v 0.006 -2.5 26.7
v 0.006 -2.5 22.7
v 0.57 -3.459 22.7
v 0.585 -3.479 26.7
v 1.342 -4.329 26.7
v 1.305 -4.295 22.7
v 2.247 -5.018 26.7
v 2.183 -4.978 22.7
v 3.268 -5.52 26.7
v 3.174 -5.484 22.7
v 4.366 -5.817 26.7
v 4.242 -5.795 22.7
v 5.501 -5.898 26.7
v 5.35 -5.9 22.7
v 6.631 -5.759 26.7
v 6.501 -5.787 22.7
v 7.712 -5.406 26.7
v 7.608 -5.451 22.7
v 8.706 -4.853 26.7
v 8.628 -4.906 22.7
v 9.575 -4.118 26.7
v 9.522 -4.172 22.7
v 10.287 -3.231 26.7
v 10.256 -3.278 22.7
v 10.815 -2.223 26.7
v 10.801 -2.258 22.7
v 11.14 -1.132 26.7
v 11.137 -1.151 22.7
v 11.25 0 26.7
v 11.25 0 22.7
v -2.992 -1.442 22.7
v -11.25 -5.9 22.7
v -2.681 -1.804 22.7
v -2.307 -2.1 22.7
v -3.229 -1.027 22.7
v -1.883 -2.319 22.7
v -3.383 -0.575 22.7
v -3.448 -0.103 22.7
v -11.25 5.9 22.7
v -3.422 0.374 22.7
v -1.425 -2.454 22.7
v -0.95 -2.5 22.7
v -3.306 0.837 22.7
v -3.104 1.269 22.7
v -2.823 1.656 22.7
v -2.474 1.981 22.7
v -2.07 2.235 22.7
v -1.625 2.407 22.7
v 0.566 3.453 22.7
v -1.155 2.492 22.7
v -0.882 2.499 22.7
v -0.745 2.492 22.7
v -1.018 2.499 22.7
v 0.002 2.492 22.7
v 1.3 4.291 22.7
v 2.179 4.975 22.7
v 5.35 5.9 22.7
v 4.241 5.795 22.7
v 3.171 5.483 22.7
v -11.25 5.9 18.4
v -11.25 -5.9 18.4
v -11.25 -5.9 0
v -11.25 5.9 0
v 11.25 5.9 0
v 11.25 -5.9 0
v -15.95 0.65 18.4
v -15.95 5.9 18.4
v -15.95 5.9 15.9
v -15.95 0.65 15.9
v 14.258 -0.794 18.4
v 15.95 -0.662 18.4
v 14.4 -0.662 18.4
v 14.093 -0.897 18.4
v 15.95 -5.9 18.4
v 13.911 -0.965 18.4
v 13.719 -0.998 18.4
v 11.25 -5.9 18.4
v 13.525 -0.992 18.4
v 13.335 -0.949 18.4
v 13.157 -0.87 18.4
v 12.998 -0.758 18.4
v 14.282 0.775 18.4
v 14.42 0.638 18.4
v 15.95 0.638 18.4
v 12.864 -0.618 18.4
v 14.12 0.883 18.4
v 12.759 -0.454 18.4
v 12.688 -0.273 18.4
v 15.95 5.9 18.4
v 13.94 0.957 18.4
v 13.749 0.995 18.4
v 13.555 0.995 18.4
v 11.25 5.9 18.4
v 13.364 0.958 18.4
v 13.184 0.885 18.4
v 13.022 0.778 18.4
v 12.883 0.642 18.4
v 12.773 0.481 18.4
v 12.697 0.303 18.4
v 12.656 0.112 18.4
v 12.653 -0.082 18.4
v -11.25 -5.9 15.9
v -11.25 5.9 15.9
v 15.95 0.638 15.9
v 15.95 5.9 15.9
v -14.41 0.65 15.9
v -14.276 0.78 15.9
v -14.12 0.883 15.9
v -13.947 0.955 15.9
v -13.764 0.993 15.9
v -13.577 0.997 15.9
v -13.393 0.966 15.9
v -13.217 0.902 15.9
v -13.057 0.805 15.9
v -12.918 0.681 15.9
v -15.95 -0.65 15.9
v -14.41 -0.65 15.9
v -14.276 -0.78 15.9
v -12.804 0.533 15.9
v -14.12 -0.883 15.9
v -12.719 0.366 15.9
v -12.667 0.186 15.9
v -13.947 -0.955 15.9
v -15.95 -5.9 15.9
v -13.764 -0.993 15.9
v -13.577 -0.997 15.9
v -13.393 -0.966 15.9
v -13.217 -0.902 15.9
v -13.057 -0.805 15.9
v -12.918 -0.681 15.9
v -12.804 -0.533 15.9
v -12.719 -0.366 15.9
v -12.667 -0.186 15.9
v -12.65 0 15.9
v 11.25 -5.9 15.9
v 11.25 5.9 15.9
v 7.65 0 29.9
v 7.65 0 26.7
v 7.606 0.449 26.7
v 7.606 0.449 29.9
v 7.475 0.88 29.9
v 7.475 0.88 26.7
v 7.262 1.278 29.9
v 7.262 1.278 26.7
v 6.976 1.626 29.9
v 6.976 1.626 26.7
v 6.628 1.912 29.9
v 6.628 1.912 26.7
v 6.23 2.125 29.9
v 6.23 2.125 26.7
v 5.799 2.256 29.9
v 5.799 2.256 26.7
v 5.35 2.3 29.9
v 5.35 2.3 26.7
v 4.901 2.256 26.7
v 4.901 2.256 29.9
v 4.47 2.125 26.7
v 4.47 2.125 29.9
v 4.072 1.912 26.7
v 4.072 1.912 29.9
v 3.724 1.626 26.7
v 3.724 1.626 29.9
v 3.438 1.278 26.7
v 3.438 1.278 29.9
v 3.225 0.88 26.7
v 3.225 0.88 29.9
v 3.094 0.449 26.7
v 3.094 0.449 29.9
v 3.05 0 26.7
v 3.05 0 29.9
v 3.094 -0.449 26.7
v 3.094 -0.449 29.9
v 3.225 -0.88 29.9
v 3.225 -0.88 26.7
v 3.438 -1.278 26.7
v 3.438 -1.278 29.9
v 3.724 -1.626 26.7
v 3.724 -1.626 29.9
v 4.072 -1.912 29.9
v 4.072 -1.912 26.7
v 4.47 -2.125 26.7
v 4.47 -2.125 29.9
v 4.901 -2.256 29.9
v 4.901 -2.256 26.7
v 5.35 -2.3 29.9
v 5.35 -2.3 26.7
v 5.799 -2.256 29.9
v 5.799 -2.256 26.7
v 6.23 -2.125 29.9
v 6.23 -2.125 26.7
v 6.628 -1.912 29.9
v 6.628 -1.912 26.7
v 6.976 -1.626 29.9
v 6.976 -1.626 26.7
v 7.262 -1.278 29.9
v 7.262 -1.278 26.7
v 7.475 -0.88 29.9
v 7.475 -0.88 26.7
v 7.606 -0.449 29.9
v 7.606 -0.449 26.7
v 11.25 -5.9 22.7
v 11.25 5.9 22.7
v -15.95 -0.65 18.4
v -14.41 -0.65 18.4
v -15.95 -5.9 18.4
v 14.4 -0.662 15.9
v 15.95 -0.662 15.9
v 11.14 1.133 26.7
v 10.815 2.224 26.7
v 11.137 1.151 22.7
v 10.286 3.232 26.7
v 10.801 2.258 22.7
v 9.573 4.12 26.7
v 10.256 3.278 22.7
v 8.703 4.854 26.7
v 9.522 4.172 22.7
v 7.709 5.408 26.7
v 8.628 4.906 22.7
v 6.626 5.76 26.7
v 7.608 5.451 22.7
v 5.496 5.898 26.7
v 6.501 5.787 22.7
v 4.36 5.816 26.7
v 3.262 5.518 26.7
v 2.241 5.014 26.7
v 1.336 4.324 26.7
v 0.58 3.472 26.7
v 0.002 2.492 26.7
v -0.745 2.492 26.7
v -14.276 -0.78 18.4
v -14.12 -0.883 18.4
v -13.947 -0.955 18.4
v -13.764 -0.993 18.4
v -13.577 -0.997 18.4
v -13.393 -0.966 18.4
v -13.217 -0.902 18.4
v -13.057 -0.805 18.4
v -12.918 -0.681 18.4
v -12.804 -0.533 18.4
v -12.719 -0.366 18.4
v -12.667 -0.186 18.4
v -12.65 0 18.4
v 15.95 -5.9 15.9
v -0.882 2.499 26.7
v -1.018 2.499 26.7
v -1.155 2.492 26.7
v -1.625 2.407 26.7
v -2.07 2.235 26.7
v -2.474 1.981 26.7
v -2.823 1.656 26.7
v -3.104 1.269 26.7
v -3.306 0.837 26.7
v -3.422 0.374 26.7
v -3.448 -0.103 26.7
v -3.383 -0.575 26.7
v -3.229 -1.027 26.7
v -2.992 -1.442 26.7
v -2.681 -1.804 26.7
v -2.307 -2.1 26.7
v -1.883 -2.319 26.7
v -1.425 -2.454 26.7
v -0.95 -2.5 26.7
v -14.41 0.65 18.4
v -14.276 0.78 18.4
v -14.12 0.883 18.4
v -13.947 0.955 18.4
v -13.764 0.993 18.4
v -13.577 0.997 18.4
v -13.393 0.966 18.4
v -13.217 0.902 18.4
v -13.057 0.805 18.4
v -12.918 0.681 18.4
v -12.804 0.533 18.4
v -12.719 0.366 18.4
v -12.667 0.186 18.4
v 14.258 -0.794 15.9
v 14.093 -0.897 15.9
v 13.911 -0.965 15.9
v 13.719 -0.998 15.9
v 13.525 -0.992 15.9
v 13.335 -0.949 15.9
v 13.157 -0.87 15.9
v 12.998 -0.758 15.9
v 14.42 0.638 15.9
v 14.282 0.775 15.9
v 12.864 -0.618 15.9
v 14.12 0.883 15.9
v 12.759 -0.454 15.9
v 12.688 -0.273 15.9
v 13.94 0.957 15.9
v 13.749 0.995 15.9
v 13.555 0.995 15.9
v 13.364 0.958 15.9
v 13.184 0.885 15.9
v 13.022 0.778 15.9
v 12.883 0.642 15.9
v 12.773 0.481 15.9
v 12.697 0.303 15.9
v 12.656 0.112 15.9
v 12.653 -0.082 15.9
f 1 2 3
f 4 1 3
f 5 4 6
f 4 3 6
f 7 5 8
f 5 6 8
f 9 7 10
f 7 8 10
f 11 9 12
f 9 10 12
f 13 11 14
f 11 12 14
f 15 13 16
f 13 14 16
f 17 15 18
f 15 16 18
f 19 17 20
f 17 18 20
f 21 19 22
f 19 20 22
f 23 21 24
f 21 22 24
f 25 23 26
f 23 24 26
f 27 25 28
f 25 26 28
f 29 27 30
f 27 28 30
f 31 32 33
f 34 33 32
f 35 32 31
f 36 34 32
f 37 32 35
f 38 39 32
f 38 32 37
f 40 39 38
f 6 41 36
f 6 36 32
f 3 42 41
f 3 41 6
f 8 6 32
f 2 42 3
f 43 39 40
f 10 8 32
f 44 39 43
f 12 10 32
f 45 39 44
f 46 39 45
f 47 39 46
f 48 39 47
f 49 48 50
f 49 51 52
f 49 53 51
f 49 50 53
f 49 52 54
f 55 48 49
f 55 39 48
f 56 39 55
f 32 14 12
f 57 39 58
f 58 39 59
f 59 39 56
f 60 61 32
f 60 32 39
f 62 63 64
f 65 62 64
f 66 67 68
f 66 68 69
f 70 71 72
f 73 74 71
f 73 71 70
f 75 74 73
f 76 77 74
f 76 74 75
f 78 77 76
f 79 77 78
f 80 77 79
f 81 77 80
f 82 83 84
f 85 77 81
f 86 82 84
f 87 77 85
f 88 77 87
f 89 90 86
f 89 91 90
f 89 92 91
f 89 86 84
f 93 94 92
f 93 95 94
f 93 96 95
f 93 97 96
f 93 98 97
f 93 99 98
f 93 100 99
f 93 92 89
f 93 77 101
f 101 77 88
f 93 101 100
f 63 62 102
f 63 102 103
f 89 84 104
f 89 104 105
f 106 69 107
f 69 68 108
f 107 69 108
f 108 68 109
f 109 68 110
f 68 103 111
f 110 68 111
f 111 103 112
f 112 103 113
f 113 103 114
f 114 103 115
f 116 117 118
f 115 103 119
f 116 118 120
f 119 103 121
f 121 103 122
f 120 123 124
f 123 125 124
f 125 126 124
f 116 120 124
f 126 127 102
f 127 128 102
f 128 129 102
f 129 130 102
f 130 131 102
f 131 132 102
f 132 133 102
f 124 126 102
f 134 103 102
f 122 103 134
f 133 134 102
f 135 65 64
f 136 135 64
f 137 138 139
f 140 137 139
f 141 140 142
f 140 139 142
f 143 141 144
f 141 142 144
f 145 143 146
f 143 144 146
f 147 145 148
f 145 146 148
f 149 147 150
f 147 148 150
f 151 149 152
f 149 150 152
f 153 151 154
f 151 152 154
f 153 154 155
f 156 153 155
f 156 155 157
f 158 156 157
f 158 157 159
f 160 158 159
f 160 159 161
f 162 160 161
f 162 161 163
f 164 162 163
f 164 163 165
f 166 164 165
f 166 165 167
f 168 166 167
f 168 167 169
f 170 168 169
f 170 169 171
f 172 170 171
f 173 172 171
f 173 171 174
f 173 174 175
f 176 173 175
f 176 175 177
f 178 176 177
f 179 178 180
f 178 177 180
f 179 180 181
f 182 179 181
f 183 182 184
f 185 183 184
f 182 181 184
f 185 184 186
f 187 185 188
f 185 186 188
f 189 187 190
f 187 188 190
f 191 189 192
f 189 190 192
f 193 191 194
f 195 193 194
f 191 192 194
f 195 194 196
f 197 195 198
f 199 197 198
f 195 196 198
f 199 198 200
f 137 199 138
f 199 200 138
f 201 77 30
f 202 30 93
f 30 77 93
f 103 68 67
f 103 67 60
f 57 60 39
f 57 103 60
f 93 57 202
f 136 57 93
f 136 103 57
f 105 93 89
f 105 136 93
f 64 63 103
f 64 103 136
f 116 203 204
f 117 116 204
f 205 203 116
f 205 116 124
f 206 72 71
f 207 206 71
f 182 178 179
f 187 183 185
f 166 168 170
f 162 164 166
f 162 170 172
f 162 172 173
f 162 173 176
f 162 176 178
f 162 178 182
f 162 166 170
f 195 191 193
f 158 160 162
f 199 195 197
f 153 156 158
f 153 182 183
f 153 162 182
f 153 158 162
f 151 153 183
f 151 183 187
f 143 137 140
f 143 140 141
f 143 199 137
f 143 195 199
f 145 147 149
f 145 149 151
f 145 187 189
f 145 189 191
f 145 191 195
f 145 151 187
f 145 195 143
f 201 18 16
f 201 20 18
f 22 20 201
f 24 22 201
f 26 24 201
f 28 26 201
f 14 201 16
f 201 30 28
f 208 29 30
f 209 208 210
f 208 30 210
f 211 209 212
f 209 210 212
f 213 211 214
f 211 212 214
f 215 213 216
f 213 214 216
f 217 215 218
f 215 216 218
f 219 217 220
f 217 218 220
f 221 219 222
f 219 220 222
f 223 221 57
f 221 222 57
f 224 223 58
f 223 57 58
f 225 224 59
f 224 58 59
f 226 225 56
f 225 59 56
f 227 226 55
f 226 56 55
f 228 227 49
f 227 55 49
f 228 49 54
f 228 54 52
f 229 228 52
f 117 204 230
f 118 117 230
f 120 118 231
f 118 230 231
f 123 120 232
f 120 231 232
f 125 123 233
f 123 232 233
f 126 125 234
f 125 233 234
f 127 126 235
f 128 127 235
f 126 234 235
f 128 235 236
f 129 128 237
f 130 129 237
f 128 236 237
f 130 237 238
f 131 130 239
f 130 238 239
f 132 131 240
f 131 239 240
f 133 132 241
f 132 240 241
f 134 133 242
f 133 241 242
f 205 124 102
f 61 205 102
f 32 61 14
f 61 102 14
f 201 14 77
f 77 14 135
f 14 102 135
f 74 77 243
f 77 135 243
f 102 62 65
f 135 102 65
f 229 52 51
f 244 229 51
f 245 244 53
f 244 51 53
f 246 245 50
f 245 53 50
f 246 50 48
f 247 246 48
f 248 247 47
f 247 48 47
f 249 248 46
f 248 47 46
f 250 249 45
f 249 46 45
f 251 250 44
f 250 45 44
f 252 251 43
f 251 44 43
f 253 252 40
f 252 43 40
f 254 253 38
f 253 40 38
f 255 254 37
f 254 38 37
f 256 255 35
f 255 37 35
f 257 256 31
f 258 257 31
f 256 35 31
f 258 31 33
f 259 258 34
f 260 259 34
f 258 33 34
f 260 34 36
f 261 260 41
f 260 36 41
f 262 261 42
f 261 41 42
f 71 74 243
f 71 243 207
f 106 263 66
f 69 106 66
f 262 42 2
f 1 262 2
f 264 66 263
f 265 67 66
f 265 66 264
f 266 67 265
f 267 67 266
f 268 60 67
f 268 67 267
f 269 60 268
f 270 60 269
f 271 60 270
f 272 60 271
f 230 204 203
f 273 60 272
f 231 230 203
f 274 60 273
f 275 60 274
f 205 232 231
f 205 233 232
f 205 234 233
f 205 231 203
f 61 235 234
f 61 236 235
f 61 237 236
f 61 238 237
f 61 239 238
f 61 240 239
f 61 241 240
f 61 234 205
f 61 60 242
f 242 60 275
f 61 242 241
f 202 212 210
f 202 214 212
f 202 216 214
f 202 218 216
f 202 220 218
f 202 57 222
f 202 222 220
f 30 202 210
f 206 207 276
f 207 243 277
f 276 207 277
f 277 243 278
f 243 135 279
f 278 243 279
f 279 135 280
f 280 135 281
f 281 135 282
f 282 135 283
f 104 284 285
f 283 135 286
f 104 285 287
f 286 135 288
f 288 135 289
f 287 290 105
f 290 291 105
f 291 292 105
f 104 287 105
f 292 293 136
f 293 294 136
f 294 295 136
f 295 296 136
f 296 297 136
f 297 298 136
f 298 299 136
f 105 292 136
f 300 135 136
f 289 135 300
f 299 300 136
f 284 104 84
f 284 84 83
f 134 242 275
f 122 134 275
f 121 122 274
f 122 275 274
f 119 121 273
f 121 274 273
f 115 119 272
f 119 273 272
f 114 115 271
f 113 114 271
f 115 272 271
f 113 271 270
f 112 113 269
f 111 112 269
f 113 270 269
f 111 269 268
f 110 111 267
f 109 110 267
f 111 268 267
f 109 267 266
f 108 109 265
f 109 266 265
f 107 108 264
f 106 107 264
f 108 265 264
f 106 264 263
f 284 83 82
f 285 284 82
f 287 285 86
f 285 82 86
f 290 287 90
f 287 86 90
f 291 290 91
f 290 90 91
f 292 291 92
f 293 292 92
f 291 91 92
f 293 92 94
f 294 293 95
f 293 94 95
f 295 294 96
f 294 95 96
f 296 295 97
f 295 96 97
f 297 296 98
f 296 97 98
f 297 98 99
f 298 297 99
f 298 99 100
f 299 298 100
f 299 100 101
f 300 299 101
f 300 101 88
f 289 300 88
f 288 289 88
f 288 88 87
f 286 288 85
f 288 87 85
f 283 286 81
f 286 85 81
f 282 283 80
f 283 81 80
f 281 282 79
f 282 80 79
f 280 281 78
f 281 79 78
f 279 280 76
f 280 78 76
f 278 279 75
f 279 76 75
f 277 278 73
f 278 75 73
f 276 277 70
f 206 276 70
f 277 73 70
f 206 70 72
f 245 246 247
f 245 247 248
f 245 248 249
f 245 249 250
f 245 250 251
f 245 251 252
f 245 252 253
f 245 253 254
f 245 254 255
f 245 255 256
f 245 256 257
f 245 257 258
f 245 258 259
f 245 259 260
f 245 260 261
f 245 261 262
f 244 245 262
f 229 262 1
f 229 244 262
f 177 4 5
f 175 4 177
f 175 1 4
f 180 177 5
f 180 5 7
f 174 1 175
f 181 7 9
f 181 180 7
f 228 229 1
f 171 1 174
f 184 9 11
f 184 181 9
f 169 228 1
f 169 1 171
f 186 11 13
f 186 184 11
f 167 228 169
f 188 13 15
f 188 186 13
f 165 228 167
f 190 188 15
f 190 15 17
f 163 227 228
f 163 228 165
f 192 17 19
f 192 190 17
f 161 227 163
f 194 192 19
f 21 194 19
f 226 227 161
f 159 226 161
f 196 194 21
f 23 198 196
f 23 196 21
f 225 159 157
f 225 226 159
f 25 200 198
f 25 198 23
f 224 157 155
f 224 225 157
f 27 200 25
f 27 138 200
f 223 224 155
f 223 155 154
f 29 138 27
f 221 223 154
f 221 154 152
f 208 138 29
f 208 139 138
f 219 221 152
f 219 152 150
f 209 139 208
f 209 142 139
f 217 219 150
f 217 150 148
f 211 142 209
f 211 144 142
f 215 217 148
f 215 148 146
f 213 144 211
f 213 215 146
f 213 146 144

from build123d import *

# Parameters (mm, degrees)
F0_W      = 22.5
F0_H      = 11.8
F1_DEPTH  = 22.7
F2_W      = 11.8
F2_H      = 2.5
F3_DEPTH  = 4.7
F4_W      = 11.8
F4_H      = 2.5
F5_DEPTH  = 4.7
F7_DEPTH  = 2.5
F9_DEPTH  = 2.5
F10_R     = 2.3
F11_DEPTH = 4
F12_DEPTH = 7.2


with BuildPart() as f1:
    # F0 (on Top) → F1 (new body)
    with BuildSketch(Plane.XY):
        Rectangle(F0_W, F0_H)
    extrude(amount=F1_DEPTH)

    # F2 (on face) → F3 (join)
    with BuildSketch(Plane(origin=(-11.25, 0, 0), x_dir=(0, -1, 0), z_dir=(-1, 0, 0))):
        with Locations((0, 17.15)):
            Rectangle(F2_W, F2_H)
    extrude(amount=F3_DEPTH)

    # F4 (on face) → F5 (join)
    with BuildSketch(Plane.YZ.offset(11.25)):
        with Locations((0, 17.15)):
            Rectangle(F4_W, F4_H)
    extrude(amount=F5_DEPTH)

    # F6 (on face) → F7 (cut)
    with BuildSketch(Plane.XY.offset(18.4)):
        with BuildLine():
            Line((-15.95, 0.65), (-15.95, 0))
            Line((-15.95, 0), (-14.65, 0))
            ThreePointArc((-14.65, 0), (-14.5880656181, 0.3464576398), (-14.4099342077, 0.65))
            Line((-14.4099342077, 0.65), (-15.95, 0.65))
        make_face()
        with BuildLine():
            Line((-14.65, 0), (-15.95, 0))
            Line((-15.95, 0), (-15.95, -0.65))
            Line((-15.95, -0.65), (-14.4099342077, -0.65))
            ThreePointArc((-14.4099342077, -0.65), (-14.5880656181, -0.3464576398), (-14.65, 0))
        make_face()
        with BuildLine():
            ThreePointArc((-14.4099342077, 0.65), (-14.5880656181, 0.3464576398), (-14.65, 0))
            ThreePointArc((-14.65, 0), (-14.5880656181, -0.3464576398), (-14.4099342077, -0.65))
            ThreePointArc((-14.4099342077, -0.65), (-13.3035423602, -0.9380656181), (-12.65, 0))
            ThreePointArc((-12.65, 0), (-13.3035423602, 0.9380656181), (-14.4099342077, 0.65))
        make_face()
    extrude(amount=-F7_DEPTH, mode=Mode.SUBTRACT)

    # F8 (on face) → F9 (cut)
    with BuildSketch(Plane.XY.offset(18.4)):
        with BuildLine():
            Line((15.95, -0.6616220634), (15.95, 0))
            Line((15.95, 0), (14.65, 0))
            ThreePointArc((14.65, 0), (14.5853709102, -0.3536682915), (14.3998374792, -0.6616220634))
            Line((14.3998374792, -0.6616220634), (15.95, -0.6616220634))
        make_face()
        with BuildLine():
            Line((14.65, 0), (15.95, 0))
            Line((15.95, 0), (15.95, 0.6383779366))
            Line((15.95, 0.6383779366), (14.4197230736, 0.6383779366))
            ThreePointArc((14.4197230736, 0.6383779366), (14.5906707909, 0.3393205906), (14.65, 0))
        make_face()
        with BuildLine():
            ThreePointArc((14.3998374792, -0.6616220634), (14.5853709102, -0.3536682915), (14.65, 0))
            ThreePointArc((14.65, 0), (14.5906707909, 0.3393205906), (14.4197230736, 0.6383779366))
            ThreePointArc((14.4197230736, 0.6383779366), (12.6501169726, 0.0152948218), (14.3998374792, -0.6616220634))
        make_face()
    extrude(amount=-F9_DEPTH, mode=Mode.SUBTRACT)

    # F10 (on face) → F11 (join)
    with BuildSketch(Plane.XY.offset(22.7)):
        with BuildLine():
            ThreePointArc((0.0058443136, -2.5), (6.6305236137, -5.759362749), (11.25, 0))
            ThreePointArc((11.25, 0), (6.6259878855, 5.7603693385), (0.0019135878, 2.4915801668))
            ThreePointArc((0.0019135878, 2.4915801668), (-0.0329189996, 2.415405358), (-0.0666666667, 2.3387437274))
            ThreePointArc((-0.0666666667, 2.3387437274), (1.1064937799, 1.4215601758), (1.55, 0))
            ThreePointArc((1.55, 0), (1.1064937799, -1.4215601758), (-0.0666666667, -2.3387437274))
            ThreePointArc((-0.0666666667, -2.3387437274), (-0.031015269, -2.4196435017), (0.0058443136, -2.5))
        make_face()
        with Locations((5.35, 0)):
            Circle(F10_R, mode=Mode.SUBTRACT)
        with BuildLine():
            ThreePointArc((-0.0666666667, 2.3387437274), (-0.0329189996, 2.415405358), (0.0019135878, 2.4915801668))
            Line((0.0019135878, 2.4915801668), (-0.7449920185, 2.4915801668))
            ThreePointArc((-0.7449920185, 2.4915801668), (-0.4004898102, 2.4388600926), (-0.0666666667, 2.3387437274))
        make_face()
        with BuildLine():
            Line((-0.95, -2.5), (0.0058443136, -2.5))
            ThreePointArc((0.0058443136, -2.5), (-0.031015269, -2.4196435017), (-0.0666666667, -2.3387437274))
            ThreePointArc((-0.0666666667, -2.3387437274), (-0.5010341429, -2.4593555374), (-0.95, -2.5))
        make_face()
        with BuildLine():
            ThreePointArc((-0.0666666667, -2.3387437274), (-0.55, 0), (-0.0666666667, 2.3387437274))
            ThreePointArc((-0.0666666667, 2.3387437274), (-0.4004898102, 2.4388600926), (-0.7449920185, 2.4915801668))
            Line((-0.7449920185, 2.4915801668), (-1.1550079815, 2.4915801668))
            ThreePointArc((-1.1550079815, 2.4915801668), (-3.4478941548, -0.1025904066), (-0.95, -2.5))
            ThreePointArc((-0.95, -2.5), (-0.5010341429, -2.4593555374), (-0.0666666667, -2.3387437274))
        make_face()
        with BuildLine():
            Line((-1.1550079815, 2.4915801668), (-0.7449920185, 2.4915801668))
            ThreePointArc((-0.7449920185, 2.4915801668), (-0.95, 2.5), (-1.1550079815, 2.4915801668))
        make_face()
        with BuildLine():
            ThreePointArc((5.3500000048, -5.9), (9.5219300107, -4.1719300073), (11.25, 0))
            ThreePointArc((11.25, 0), (9.521930009, 4.171930009), (5.35, 5.9))
            ThreePointArc((5.35, 5.9), (2.1790634652, 4.975455908), (0.0019135878, 2.4915801668))
            ThreePointArc((0.0019135878, 2.4915801668), (-0.0329189996, 2.415405358), (-0.0666666667, 2.3387437274))
            ThreePointArc((-0.0666666667, 2.3387437274), (1.1064937799, 1.4215601758), (1.55, 0))
            ThreePointArc((1.55, 0), (1.1064937799, -1.4215601758), (-0.0666666667, -2.3387437274))
            ThreePointArc((-0.0666666667, -2.3387437274), (-0.031015269, -2.4196435017), (0.0058443136, -2.5))
            ThreePointArc((0.0058443136, -2.5), (2.1829824776, -4.9779513872), (5.3500000048, -5.9))
        make_face()
        with Locations((5.35, 0)):
            Circle(F10_R, mode=Mode.SUBTRACT)
        with BuildLine():
            ThreePointArc((1.55, 0), (1.1064937799, 1.4215601758), (-0.0666666667, 2.3387437274))
            ThreePointArc((-0.0666666667, 2.3387437274), (-0.55, 0), (-0.0666666667, -2.3387437274))
            ThreePointArc((-0.0666666667, -2.3387437274), (1.1064937799, -1.4215601758), (1.55, 0))
        make_face()
    extrude(amount=F11_DEPTH)

    # F12 (add): a face of the model
    f12_faces = [f1.faces().sort_by_distance(p)[0] for p in [
        (5.35, 0, 22.7),
    ]]
    extrude(f12_faces, amount=F12_DEPTH)


solid = f1.part
